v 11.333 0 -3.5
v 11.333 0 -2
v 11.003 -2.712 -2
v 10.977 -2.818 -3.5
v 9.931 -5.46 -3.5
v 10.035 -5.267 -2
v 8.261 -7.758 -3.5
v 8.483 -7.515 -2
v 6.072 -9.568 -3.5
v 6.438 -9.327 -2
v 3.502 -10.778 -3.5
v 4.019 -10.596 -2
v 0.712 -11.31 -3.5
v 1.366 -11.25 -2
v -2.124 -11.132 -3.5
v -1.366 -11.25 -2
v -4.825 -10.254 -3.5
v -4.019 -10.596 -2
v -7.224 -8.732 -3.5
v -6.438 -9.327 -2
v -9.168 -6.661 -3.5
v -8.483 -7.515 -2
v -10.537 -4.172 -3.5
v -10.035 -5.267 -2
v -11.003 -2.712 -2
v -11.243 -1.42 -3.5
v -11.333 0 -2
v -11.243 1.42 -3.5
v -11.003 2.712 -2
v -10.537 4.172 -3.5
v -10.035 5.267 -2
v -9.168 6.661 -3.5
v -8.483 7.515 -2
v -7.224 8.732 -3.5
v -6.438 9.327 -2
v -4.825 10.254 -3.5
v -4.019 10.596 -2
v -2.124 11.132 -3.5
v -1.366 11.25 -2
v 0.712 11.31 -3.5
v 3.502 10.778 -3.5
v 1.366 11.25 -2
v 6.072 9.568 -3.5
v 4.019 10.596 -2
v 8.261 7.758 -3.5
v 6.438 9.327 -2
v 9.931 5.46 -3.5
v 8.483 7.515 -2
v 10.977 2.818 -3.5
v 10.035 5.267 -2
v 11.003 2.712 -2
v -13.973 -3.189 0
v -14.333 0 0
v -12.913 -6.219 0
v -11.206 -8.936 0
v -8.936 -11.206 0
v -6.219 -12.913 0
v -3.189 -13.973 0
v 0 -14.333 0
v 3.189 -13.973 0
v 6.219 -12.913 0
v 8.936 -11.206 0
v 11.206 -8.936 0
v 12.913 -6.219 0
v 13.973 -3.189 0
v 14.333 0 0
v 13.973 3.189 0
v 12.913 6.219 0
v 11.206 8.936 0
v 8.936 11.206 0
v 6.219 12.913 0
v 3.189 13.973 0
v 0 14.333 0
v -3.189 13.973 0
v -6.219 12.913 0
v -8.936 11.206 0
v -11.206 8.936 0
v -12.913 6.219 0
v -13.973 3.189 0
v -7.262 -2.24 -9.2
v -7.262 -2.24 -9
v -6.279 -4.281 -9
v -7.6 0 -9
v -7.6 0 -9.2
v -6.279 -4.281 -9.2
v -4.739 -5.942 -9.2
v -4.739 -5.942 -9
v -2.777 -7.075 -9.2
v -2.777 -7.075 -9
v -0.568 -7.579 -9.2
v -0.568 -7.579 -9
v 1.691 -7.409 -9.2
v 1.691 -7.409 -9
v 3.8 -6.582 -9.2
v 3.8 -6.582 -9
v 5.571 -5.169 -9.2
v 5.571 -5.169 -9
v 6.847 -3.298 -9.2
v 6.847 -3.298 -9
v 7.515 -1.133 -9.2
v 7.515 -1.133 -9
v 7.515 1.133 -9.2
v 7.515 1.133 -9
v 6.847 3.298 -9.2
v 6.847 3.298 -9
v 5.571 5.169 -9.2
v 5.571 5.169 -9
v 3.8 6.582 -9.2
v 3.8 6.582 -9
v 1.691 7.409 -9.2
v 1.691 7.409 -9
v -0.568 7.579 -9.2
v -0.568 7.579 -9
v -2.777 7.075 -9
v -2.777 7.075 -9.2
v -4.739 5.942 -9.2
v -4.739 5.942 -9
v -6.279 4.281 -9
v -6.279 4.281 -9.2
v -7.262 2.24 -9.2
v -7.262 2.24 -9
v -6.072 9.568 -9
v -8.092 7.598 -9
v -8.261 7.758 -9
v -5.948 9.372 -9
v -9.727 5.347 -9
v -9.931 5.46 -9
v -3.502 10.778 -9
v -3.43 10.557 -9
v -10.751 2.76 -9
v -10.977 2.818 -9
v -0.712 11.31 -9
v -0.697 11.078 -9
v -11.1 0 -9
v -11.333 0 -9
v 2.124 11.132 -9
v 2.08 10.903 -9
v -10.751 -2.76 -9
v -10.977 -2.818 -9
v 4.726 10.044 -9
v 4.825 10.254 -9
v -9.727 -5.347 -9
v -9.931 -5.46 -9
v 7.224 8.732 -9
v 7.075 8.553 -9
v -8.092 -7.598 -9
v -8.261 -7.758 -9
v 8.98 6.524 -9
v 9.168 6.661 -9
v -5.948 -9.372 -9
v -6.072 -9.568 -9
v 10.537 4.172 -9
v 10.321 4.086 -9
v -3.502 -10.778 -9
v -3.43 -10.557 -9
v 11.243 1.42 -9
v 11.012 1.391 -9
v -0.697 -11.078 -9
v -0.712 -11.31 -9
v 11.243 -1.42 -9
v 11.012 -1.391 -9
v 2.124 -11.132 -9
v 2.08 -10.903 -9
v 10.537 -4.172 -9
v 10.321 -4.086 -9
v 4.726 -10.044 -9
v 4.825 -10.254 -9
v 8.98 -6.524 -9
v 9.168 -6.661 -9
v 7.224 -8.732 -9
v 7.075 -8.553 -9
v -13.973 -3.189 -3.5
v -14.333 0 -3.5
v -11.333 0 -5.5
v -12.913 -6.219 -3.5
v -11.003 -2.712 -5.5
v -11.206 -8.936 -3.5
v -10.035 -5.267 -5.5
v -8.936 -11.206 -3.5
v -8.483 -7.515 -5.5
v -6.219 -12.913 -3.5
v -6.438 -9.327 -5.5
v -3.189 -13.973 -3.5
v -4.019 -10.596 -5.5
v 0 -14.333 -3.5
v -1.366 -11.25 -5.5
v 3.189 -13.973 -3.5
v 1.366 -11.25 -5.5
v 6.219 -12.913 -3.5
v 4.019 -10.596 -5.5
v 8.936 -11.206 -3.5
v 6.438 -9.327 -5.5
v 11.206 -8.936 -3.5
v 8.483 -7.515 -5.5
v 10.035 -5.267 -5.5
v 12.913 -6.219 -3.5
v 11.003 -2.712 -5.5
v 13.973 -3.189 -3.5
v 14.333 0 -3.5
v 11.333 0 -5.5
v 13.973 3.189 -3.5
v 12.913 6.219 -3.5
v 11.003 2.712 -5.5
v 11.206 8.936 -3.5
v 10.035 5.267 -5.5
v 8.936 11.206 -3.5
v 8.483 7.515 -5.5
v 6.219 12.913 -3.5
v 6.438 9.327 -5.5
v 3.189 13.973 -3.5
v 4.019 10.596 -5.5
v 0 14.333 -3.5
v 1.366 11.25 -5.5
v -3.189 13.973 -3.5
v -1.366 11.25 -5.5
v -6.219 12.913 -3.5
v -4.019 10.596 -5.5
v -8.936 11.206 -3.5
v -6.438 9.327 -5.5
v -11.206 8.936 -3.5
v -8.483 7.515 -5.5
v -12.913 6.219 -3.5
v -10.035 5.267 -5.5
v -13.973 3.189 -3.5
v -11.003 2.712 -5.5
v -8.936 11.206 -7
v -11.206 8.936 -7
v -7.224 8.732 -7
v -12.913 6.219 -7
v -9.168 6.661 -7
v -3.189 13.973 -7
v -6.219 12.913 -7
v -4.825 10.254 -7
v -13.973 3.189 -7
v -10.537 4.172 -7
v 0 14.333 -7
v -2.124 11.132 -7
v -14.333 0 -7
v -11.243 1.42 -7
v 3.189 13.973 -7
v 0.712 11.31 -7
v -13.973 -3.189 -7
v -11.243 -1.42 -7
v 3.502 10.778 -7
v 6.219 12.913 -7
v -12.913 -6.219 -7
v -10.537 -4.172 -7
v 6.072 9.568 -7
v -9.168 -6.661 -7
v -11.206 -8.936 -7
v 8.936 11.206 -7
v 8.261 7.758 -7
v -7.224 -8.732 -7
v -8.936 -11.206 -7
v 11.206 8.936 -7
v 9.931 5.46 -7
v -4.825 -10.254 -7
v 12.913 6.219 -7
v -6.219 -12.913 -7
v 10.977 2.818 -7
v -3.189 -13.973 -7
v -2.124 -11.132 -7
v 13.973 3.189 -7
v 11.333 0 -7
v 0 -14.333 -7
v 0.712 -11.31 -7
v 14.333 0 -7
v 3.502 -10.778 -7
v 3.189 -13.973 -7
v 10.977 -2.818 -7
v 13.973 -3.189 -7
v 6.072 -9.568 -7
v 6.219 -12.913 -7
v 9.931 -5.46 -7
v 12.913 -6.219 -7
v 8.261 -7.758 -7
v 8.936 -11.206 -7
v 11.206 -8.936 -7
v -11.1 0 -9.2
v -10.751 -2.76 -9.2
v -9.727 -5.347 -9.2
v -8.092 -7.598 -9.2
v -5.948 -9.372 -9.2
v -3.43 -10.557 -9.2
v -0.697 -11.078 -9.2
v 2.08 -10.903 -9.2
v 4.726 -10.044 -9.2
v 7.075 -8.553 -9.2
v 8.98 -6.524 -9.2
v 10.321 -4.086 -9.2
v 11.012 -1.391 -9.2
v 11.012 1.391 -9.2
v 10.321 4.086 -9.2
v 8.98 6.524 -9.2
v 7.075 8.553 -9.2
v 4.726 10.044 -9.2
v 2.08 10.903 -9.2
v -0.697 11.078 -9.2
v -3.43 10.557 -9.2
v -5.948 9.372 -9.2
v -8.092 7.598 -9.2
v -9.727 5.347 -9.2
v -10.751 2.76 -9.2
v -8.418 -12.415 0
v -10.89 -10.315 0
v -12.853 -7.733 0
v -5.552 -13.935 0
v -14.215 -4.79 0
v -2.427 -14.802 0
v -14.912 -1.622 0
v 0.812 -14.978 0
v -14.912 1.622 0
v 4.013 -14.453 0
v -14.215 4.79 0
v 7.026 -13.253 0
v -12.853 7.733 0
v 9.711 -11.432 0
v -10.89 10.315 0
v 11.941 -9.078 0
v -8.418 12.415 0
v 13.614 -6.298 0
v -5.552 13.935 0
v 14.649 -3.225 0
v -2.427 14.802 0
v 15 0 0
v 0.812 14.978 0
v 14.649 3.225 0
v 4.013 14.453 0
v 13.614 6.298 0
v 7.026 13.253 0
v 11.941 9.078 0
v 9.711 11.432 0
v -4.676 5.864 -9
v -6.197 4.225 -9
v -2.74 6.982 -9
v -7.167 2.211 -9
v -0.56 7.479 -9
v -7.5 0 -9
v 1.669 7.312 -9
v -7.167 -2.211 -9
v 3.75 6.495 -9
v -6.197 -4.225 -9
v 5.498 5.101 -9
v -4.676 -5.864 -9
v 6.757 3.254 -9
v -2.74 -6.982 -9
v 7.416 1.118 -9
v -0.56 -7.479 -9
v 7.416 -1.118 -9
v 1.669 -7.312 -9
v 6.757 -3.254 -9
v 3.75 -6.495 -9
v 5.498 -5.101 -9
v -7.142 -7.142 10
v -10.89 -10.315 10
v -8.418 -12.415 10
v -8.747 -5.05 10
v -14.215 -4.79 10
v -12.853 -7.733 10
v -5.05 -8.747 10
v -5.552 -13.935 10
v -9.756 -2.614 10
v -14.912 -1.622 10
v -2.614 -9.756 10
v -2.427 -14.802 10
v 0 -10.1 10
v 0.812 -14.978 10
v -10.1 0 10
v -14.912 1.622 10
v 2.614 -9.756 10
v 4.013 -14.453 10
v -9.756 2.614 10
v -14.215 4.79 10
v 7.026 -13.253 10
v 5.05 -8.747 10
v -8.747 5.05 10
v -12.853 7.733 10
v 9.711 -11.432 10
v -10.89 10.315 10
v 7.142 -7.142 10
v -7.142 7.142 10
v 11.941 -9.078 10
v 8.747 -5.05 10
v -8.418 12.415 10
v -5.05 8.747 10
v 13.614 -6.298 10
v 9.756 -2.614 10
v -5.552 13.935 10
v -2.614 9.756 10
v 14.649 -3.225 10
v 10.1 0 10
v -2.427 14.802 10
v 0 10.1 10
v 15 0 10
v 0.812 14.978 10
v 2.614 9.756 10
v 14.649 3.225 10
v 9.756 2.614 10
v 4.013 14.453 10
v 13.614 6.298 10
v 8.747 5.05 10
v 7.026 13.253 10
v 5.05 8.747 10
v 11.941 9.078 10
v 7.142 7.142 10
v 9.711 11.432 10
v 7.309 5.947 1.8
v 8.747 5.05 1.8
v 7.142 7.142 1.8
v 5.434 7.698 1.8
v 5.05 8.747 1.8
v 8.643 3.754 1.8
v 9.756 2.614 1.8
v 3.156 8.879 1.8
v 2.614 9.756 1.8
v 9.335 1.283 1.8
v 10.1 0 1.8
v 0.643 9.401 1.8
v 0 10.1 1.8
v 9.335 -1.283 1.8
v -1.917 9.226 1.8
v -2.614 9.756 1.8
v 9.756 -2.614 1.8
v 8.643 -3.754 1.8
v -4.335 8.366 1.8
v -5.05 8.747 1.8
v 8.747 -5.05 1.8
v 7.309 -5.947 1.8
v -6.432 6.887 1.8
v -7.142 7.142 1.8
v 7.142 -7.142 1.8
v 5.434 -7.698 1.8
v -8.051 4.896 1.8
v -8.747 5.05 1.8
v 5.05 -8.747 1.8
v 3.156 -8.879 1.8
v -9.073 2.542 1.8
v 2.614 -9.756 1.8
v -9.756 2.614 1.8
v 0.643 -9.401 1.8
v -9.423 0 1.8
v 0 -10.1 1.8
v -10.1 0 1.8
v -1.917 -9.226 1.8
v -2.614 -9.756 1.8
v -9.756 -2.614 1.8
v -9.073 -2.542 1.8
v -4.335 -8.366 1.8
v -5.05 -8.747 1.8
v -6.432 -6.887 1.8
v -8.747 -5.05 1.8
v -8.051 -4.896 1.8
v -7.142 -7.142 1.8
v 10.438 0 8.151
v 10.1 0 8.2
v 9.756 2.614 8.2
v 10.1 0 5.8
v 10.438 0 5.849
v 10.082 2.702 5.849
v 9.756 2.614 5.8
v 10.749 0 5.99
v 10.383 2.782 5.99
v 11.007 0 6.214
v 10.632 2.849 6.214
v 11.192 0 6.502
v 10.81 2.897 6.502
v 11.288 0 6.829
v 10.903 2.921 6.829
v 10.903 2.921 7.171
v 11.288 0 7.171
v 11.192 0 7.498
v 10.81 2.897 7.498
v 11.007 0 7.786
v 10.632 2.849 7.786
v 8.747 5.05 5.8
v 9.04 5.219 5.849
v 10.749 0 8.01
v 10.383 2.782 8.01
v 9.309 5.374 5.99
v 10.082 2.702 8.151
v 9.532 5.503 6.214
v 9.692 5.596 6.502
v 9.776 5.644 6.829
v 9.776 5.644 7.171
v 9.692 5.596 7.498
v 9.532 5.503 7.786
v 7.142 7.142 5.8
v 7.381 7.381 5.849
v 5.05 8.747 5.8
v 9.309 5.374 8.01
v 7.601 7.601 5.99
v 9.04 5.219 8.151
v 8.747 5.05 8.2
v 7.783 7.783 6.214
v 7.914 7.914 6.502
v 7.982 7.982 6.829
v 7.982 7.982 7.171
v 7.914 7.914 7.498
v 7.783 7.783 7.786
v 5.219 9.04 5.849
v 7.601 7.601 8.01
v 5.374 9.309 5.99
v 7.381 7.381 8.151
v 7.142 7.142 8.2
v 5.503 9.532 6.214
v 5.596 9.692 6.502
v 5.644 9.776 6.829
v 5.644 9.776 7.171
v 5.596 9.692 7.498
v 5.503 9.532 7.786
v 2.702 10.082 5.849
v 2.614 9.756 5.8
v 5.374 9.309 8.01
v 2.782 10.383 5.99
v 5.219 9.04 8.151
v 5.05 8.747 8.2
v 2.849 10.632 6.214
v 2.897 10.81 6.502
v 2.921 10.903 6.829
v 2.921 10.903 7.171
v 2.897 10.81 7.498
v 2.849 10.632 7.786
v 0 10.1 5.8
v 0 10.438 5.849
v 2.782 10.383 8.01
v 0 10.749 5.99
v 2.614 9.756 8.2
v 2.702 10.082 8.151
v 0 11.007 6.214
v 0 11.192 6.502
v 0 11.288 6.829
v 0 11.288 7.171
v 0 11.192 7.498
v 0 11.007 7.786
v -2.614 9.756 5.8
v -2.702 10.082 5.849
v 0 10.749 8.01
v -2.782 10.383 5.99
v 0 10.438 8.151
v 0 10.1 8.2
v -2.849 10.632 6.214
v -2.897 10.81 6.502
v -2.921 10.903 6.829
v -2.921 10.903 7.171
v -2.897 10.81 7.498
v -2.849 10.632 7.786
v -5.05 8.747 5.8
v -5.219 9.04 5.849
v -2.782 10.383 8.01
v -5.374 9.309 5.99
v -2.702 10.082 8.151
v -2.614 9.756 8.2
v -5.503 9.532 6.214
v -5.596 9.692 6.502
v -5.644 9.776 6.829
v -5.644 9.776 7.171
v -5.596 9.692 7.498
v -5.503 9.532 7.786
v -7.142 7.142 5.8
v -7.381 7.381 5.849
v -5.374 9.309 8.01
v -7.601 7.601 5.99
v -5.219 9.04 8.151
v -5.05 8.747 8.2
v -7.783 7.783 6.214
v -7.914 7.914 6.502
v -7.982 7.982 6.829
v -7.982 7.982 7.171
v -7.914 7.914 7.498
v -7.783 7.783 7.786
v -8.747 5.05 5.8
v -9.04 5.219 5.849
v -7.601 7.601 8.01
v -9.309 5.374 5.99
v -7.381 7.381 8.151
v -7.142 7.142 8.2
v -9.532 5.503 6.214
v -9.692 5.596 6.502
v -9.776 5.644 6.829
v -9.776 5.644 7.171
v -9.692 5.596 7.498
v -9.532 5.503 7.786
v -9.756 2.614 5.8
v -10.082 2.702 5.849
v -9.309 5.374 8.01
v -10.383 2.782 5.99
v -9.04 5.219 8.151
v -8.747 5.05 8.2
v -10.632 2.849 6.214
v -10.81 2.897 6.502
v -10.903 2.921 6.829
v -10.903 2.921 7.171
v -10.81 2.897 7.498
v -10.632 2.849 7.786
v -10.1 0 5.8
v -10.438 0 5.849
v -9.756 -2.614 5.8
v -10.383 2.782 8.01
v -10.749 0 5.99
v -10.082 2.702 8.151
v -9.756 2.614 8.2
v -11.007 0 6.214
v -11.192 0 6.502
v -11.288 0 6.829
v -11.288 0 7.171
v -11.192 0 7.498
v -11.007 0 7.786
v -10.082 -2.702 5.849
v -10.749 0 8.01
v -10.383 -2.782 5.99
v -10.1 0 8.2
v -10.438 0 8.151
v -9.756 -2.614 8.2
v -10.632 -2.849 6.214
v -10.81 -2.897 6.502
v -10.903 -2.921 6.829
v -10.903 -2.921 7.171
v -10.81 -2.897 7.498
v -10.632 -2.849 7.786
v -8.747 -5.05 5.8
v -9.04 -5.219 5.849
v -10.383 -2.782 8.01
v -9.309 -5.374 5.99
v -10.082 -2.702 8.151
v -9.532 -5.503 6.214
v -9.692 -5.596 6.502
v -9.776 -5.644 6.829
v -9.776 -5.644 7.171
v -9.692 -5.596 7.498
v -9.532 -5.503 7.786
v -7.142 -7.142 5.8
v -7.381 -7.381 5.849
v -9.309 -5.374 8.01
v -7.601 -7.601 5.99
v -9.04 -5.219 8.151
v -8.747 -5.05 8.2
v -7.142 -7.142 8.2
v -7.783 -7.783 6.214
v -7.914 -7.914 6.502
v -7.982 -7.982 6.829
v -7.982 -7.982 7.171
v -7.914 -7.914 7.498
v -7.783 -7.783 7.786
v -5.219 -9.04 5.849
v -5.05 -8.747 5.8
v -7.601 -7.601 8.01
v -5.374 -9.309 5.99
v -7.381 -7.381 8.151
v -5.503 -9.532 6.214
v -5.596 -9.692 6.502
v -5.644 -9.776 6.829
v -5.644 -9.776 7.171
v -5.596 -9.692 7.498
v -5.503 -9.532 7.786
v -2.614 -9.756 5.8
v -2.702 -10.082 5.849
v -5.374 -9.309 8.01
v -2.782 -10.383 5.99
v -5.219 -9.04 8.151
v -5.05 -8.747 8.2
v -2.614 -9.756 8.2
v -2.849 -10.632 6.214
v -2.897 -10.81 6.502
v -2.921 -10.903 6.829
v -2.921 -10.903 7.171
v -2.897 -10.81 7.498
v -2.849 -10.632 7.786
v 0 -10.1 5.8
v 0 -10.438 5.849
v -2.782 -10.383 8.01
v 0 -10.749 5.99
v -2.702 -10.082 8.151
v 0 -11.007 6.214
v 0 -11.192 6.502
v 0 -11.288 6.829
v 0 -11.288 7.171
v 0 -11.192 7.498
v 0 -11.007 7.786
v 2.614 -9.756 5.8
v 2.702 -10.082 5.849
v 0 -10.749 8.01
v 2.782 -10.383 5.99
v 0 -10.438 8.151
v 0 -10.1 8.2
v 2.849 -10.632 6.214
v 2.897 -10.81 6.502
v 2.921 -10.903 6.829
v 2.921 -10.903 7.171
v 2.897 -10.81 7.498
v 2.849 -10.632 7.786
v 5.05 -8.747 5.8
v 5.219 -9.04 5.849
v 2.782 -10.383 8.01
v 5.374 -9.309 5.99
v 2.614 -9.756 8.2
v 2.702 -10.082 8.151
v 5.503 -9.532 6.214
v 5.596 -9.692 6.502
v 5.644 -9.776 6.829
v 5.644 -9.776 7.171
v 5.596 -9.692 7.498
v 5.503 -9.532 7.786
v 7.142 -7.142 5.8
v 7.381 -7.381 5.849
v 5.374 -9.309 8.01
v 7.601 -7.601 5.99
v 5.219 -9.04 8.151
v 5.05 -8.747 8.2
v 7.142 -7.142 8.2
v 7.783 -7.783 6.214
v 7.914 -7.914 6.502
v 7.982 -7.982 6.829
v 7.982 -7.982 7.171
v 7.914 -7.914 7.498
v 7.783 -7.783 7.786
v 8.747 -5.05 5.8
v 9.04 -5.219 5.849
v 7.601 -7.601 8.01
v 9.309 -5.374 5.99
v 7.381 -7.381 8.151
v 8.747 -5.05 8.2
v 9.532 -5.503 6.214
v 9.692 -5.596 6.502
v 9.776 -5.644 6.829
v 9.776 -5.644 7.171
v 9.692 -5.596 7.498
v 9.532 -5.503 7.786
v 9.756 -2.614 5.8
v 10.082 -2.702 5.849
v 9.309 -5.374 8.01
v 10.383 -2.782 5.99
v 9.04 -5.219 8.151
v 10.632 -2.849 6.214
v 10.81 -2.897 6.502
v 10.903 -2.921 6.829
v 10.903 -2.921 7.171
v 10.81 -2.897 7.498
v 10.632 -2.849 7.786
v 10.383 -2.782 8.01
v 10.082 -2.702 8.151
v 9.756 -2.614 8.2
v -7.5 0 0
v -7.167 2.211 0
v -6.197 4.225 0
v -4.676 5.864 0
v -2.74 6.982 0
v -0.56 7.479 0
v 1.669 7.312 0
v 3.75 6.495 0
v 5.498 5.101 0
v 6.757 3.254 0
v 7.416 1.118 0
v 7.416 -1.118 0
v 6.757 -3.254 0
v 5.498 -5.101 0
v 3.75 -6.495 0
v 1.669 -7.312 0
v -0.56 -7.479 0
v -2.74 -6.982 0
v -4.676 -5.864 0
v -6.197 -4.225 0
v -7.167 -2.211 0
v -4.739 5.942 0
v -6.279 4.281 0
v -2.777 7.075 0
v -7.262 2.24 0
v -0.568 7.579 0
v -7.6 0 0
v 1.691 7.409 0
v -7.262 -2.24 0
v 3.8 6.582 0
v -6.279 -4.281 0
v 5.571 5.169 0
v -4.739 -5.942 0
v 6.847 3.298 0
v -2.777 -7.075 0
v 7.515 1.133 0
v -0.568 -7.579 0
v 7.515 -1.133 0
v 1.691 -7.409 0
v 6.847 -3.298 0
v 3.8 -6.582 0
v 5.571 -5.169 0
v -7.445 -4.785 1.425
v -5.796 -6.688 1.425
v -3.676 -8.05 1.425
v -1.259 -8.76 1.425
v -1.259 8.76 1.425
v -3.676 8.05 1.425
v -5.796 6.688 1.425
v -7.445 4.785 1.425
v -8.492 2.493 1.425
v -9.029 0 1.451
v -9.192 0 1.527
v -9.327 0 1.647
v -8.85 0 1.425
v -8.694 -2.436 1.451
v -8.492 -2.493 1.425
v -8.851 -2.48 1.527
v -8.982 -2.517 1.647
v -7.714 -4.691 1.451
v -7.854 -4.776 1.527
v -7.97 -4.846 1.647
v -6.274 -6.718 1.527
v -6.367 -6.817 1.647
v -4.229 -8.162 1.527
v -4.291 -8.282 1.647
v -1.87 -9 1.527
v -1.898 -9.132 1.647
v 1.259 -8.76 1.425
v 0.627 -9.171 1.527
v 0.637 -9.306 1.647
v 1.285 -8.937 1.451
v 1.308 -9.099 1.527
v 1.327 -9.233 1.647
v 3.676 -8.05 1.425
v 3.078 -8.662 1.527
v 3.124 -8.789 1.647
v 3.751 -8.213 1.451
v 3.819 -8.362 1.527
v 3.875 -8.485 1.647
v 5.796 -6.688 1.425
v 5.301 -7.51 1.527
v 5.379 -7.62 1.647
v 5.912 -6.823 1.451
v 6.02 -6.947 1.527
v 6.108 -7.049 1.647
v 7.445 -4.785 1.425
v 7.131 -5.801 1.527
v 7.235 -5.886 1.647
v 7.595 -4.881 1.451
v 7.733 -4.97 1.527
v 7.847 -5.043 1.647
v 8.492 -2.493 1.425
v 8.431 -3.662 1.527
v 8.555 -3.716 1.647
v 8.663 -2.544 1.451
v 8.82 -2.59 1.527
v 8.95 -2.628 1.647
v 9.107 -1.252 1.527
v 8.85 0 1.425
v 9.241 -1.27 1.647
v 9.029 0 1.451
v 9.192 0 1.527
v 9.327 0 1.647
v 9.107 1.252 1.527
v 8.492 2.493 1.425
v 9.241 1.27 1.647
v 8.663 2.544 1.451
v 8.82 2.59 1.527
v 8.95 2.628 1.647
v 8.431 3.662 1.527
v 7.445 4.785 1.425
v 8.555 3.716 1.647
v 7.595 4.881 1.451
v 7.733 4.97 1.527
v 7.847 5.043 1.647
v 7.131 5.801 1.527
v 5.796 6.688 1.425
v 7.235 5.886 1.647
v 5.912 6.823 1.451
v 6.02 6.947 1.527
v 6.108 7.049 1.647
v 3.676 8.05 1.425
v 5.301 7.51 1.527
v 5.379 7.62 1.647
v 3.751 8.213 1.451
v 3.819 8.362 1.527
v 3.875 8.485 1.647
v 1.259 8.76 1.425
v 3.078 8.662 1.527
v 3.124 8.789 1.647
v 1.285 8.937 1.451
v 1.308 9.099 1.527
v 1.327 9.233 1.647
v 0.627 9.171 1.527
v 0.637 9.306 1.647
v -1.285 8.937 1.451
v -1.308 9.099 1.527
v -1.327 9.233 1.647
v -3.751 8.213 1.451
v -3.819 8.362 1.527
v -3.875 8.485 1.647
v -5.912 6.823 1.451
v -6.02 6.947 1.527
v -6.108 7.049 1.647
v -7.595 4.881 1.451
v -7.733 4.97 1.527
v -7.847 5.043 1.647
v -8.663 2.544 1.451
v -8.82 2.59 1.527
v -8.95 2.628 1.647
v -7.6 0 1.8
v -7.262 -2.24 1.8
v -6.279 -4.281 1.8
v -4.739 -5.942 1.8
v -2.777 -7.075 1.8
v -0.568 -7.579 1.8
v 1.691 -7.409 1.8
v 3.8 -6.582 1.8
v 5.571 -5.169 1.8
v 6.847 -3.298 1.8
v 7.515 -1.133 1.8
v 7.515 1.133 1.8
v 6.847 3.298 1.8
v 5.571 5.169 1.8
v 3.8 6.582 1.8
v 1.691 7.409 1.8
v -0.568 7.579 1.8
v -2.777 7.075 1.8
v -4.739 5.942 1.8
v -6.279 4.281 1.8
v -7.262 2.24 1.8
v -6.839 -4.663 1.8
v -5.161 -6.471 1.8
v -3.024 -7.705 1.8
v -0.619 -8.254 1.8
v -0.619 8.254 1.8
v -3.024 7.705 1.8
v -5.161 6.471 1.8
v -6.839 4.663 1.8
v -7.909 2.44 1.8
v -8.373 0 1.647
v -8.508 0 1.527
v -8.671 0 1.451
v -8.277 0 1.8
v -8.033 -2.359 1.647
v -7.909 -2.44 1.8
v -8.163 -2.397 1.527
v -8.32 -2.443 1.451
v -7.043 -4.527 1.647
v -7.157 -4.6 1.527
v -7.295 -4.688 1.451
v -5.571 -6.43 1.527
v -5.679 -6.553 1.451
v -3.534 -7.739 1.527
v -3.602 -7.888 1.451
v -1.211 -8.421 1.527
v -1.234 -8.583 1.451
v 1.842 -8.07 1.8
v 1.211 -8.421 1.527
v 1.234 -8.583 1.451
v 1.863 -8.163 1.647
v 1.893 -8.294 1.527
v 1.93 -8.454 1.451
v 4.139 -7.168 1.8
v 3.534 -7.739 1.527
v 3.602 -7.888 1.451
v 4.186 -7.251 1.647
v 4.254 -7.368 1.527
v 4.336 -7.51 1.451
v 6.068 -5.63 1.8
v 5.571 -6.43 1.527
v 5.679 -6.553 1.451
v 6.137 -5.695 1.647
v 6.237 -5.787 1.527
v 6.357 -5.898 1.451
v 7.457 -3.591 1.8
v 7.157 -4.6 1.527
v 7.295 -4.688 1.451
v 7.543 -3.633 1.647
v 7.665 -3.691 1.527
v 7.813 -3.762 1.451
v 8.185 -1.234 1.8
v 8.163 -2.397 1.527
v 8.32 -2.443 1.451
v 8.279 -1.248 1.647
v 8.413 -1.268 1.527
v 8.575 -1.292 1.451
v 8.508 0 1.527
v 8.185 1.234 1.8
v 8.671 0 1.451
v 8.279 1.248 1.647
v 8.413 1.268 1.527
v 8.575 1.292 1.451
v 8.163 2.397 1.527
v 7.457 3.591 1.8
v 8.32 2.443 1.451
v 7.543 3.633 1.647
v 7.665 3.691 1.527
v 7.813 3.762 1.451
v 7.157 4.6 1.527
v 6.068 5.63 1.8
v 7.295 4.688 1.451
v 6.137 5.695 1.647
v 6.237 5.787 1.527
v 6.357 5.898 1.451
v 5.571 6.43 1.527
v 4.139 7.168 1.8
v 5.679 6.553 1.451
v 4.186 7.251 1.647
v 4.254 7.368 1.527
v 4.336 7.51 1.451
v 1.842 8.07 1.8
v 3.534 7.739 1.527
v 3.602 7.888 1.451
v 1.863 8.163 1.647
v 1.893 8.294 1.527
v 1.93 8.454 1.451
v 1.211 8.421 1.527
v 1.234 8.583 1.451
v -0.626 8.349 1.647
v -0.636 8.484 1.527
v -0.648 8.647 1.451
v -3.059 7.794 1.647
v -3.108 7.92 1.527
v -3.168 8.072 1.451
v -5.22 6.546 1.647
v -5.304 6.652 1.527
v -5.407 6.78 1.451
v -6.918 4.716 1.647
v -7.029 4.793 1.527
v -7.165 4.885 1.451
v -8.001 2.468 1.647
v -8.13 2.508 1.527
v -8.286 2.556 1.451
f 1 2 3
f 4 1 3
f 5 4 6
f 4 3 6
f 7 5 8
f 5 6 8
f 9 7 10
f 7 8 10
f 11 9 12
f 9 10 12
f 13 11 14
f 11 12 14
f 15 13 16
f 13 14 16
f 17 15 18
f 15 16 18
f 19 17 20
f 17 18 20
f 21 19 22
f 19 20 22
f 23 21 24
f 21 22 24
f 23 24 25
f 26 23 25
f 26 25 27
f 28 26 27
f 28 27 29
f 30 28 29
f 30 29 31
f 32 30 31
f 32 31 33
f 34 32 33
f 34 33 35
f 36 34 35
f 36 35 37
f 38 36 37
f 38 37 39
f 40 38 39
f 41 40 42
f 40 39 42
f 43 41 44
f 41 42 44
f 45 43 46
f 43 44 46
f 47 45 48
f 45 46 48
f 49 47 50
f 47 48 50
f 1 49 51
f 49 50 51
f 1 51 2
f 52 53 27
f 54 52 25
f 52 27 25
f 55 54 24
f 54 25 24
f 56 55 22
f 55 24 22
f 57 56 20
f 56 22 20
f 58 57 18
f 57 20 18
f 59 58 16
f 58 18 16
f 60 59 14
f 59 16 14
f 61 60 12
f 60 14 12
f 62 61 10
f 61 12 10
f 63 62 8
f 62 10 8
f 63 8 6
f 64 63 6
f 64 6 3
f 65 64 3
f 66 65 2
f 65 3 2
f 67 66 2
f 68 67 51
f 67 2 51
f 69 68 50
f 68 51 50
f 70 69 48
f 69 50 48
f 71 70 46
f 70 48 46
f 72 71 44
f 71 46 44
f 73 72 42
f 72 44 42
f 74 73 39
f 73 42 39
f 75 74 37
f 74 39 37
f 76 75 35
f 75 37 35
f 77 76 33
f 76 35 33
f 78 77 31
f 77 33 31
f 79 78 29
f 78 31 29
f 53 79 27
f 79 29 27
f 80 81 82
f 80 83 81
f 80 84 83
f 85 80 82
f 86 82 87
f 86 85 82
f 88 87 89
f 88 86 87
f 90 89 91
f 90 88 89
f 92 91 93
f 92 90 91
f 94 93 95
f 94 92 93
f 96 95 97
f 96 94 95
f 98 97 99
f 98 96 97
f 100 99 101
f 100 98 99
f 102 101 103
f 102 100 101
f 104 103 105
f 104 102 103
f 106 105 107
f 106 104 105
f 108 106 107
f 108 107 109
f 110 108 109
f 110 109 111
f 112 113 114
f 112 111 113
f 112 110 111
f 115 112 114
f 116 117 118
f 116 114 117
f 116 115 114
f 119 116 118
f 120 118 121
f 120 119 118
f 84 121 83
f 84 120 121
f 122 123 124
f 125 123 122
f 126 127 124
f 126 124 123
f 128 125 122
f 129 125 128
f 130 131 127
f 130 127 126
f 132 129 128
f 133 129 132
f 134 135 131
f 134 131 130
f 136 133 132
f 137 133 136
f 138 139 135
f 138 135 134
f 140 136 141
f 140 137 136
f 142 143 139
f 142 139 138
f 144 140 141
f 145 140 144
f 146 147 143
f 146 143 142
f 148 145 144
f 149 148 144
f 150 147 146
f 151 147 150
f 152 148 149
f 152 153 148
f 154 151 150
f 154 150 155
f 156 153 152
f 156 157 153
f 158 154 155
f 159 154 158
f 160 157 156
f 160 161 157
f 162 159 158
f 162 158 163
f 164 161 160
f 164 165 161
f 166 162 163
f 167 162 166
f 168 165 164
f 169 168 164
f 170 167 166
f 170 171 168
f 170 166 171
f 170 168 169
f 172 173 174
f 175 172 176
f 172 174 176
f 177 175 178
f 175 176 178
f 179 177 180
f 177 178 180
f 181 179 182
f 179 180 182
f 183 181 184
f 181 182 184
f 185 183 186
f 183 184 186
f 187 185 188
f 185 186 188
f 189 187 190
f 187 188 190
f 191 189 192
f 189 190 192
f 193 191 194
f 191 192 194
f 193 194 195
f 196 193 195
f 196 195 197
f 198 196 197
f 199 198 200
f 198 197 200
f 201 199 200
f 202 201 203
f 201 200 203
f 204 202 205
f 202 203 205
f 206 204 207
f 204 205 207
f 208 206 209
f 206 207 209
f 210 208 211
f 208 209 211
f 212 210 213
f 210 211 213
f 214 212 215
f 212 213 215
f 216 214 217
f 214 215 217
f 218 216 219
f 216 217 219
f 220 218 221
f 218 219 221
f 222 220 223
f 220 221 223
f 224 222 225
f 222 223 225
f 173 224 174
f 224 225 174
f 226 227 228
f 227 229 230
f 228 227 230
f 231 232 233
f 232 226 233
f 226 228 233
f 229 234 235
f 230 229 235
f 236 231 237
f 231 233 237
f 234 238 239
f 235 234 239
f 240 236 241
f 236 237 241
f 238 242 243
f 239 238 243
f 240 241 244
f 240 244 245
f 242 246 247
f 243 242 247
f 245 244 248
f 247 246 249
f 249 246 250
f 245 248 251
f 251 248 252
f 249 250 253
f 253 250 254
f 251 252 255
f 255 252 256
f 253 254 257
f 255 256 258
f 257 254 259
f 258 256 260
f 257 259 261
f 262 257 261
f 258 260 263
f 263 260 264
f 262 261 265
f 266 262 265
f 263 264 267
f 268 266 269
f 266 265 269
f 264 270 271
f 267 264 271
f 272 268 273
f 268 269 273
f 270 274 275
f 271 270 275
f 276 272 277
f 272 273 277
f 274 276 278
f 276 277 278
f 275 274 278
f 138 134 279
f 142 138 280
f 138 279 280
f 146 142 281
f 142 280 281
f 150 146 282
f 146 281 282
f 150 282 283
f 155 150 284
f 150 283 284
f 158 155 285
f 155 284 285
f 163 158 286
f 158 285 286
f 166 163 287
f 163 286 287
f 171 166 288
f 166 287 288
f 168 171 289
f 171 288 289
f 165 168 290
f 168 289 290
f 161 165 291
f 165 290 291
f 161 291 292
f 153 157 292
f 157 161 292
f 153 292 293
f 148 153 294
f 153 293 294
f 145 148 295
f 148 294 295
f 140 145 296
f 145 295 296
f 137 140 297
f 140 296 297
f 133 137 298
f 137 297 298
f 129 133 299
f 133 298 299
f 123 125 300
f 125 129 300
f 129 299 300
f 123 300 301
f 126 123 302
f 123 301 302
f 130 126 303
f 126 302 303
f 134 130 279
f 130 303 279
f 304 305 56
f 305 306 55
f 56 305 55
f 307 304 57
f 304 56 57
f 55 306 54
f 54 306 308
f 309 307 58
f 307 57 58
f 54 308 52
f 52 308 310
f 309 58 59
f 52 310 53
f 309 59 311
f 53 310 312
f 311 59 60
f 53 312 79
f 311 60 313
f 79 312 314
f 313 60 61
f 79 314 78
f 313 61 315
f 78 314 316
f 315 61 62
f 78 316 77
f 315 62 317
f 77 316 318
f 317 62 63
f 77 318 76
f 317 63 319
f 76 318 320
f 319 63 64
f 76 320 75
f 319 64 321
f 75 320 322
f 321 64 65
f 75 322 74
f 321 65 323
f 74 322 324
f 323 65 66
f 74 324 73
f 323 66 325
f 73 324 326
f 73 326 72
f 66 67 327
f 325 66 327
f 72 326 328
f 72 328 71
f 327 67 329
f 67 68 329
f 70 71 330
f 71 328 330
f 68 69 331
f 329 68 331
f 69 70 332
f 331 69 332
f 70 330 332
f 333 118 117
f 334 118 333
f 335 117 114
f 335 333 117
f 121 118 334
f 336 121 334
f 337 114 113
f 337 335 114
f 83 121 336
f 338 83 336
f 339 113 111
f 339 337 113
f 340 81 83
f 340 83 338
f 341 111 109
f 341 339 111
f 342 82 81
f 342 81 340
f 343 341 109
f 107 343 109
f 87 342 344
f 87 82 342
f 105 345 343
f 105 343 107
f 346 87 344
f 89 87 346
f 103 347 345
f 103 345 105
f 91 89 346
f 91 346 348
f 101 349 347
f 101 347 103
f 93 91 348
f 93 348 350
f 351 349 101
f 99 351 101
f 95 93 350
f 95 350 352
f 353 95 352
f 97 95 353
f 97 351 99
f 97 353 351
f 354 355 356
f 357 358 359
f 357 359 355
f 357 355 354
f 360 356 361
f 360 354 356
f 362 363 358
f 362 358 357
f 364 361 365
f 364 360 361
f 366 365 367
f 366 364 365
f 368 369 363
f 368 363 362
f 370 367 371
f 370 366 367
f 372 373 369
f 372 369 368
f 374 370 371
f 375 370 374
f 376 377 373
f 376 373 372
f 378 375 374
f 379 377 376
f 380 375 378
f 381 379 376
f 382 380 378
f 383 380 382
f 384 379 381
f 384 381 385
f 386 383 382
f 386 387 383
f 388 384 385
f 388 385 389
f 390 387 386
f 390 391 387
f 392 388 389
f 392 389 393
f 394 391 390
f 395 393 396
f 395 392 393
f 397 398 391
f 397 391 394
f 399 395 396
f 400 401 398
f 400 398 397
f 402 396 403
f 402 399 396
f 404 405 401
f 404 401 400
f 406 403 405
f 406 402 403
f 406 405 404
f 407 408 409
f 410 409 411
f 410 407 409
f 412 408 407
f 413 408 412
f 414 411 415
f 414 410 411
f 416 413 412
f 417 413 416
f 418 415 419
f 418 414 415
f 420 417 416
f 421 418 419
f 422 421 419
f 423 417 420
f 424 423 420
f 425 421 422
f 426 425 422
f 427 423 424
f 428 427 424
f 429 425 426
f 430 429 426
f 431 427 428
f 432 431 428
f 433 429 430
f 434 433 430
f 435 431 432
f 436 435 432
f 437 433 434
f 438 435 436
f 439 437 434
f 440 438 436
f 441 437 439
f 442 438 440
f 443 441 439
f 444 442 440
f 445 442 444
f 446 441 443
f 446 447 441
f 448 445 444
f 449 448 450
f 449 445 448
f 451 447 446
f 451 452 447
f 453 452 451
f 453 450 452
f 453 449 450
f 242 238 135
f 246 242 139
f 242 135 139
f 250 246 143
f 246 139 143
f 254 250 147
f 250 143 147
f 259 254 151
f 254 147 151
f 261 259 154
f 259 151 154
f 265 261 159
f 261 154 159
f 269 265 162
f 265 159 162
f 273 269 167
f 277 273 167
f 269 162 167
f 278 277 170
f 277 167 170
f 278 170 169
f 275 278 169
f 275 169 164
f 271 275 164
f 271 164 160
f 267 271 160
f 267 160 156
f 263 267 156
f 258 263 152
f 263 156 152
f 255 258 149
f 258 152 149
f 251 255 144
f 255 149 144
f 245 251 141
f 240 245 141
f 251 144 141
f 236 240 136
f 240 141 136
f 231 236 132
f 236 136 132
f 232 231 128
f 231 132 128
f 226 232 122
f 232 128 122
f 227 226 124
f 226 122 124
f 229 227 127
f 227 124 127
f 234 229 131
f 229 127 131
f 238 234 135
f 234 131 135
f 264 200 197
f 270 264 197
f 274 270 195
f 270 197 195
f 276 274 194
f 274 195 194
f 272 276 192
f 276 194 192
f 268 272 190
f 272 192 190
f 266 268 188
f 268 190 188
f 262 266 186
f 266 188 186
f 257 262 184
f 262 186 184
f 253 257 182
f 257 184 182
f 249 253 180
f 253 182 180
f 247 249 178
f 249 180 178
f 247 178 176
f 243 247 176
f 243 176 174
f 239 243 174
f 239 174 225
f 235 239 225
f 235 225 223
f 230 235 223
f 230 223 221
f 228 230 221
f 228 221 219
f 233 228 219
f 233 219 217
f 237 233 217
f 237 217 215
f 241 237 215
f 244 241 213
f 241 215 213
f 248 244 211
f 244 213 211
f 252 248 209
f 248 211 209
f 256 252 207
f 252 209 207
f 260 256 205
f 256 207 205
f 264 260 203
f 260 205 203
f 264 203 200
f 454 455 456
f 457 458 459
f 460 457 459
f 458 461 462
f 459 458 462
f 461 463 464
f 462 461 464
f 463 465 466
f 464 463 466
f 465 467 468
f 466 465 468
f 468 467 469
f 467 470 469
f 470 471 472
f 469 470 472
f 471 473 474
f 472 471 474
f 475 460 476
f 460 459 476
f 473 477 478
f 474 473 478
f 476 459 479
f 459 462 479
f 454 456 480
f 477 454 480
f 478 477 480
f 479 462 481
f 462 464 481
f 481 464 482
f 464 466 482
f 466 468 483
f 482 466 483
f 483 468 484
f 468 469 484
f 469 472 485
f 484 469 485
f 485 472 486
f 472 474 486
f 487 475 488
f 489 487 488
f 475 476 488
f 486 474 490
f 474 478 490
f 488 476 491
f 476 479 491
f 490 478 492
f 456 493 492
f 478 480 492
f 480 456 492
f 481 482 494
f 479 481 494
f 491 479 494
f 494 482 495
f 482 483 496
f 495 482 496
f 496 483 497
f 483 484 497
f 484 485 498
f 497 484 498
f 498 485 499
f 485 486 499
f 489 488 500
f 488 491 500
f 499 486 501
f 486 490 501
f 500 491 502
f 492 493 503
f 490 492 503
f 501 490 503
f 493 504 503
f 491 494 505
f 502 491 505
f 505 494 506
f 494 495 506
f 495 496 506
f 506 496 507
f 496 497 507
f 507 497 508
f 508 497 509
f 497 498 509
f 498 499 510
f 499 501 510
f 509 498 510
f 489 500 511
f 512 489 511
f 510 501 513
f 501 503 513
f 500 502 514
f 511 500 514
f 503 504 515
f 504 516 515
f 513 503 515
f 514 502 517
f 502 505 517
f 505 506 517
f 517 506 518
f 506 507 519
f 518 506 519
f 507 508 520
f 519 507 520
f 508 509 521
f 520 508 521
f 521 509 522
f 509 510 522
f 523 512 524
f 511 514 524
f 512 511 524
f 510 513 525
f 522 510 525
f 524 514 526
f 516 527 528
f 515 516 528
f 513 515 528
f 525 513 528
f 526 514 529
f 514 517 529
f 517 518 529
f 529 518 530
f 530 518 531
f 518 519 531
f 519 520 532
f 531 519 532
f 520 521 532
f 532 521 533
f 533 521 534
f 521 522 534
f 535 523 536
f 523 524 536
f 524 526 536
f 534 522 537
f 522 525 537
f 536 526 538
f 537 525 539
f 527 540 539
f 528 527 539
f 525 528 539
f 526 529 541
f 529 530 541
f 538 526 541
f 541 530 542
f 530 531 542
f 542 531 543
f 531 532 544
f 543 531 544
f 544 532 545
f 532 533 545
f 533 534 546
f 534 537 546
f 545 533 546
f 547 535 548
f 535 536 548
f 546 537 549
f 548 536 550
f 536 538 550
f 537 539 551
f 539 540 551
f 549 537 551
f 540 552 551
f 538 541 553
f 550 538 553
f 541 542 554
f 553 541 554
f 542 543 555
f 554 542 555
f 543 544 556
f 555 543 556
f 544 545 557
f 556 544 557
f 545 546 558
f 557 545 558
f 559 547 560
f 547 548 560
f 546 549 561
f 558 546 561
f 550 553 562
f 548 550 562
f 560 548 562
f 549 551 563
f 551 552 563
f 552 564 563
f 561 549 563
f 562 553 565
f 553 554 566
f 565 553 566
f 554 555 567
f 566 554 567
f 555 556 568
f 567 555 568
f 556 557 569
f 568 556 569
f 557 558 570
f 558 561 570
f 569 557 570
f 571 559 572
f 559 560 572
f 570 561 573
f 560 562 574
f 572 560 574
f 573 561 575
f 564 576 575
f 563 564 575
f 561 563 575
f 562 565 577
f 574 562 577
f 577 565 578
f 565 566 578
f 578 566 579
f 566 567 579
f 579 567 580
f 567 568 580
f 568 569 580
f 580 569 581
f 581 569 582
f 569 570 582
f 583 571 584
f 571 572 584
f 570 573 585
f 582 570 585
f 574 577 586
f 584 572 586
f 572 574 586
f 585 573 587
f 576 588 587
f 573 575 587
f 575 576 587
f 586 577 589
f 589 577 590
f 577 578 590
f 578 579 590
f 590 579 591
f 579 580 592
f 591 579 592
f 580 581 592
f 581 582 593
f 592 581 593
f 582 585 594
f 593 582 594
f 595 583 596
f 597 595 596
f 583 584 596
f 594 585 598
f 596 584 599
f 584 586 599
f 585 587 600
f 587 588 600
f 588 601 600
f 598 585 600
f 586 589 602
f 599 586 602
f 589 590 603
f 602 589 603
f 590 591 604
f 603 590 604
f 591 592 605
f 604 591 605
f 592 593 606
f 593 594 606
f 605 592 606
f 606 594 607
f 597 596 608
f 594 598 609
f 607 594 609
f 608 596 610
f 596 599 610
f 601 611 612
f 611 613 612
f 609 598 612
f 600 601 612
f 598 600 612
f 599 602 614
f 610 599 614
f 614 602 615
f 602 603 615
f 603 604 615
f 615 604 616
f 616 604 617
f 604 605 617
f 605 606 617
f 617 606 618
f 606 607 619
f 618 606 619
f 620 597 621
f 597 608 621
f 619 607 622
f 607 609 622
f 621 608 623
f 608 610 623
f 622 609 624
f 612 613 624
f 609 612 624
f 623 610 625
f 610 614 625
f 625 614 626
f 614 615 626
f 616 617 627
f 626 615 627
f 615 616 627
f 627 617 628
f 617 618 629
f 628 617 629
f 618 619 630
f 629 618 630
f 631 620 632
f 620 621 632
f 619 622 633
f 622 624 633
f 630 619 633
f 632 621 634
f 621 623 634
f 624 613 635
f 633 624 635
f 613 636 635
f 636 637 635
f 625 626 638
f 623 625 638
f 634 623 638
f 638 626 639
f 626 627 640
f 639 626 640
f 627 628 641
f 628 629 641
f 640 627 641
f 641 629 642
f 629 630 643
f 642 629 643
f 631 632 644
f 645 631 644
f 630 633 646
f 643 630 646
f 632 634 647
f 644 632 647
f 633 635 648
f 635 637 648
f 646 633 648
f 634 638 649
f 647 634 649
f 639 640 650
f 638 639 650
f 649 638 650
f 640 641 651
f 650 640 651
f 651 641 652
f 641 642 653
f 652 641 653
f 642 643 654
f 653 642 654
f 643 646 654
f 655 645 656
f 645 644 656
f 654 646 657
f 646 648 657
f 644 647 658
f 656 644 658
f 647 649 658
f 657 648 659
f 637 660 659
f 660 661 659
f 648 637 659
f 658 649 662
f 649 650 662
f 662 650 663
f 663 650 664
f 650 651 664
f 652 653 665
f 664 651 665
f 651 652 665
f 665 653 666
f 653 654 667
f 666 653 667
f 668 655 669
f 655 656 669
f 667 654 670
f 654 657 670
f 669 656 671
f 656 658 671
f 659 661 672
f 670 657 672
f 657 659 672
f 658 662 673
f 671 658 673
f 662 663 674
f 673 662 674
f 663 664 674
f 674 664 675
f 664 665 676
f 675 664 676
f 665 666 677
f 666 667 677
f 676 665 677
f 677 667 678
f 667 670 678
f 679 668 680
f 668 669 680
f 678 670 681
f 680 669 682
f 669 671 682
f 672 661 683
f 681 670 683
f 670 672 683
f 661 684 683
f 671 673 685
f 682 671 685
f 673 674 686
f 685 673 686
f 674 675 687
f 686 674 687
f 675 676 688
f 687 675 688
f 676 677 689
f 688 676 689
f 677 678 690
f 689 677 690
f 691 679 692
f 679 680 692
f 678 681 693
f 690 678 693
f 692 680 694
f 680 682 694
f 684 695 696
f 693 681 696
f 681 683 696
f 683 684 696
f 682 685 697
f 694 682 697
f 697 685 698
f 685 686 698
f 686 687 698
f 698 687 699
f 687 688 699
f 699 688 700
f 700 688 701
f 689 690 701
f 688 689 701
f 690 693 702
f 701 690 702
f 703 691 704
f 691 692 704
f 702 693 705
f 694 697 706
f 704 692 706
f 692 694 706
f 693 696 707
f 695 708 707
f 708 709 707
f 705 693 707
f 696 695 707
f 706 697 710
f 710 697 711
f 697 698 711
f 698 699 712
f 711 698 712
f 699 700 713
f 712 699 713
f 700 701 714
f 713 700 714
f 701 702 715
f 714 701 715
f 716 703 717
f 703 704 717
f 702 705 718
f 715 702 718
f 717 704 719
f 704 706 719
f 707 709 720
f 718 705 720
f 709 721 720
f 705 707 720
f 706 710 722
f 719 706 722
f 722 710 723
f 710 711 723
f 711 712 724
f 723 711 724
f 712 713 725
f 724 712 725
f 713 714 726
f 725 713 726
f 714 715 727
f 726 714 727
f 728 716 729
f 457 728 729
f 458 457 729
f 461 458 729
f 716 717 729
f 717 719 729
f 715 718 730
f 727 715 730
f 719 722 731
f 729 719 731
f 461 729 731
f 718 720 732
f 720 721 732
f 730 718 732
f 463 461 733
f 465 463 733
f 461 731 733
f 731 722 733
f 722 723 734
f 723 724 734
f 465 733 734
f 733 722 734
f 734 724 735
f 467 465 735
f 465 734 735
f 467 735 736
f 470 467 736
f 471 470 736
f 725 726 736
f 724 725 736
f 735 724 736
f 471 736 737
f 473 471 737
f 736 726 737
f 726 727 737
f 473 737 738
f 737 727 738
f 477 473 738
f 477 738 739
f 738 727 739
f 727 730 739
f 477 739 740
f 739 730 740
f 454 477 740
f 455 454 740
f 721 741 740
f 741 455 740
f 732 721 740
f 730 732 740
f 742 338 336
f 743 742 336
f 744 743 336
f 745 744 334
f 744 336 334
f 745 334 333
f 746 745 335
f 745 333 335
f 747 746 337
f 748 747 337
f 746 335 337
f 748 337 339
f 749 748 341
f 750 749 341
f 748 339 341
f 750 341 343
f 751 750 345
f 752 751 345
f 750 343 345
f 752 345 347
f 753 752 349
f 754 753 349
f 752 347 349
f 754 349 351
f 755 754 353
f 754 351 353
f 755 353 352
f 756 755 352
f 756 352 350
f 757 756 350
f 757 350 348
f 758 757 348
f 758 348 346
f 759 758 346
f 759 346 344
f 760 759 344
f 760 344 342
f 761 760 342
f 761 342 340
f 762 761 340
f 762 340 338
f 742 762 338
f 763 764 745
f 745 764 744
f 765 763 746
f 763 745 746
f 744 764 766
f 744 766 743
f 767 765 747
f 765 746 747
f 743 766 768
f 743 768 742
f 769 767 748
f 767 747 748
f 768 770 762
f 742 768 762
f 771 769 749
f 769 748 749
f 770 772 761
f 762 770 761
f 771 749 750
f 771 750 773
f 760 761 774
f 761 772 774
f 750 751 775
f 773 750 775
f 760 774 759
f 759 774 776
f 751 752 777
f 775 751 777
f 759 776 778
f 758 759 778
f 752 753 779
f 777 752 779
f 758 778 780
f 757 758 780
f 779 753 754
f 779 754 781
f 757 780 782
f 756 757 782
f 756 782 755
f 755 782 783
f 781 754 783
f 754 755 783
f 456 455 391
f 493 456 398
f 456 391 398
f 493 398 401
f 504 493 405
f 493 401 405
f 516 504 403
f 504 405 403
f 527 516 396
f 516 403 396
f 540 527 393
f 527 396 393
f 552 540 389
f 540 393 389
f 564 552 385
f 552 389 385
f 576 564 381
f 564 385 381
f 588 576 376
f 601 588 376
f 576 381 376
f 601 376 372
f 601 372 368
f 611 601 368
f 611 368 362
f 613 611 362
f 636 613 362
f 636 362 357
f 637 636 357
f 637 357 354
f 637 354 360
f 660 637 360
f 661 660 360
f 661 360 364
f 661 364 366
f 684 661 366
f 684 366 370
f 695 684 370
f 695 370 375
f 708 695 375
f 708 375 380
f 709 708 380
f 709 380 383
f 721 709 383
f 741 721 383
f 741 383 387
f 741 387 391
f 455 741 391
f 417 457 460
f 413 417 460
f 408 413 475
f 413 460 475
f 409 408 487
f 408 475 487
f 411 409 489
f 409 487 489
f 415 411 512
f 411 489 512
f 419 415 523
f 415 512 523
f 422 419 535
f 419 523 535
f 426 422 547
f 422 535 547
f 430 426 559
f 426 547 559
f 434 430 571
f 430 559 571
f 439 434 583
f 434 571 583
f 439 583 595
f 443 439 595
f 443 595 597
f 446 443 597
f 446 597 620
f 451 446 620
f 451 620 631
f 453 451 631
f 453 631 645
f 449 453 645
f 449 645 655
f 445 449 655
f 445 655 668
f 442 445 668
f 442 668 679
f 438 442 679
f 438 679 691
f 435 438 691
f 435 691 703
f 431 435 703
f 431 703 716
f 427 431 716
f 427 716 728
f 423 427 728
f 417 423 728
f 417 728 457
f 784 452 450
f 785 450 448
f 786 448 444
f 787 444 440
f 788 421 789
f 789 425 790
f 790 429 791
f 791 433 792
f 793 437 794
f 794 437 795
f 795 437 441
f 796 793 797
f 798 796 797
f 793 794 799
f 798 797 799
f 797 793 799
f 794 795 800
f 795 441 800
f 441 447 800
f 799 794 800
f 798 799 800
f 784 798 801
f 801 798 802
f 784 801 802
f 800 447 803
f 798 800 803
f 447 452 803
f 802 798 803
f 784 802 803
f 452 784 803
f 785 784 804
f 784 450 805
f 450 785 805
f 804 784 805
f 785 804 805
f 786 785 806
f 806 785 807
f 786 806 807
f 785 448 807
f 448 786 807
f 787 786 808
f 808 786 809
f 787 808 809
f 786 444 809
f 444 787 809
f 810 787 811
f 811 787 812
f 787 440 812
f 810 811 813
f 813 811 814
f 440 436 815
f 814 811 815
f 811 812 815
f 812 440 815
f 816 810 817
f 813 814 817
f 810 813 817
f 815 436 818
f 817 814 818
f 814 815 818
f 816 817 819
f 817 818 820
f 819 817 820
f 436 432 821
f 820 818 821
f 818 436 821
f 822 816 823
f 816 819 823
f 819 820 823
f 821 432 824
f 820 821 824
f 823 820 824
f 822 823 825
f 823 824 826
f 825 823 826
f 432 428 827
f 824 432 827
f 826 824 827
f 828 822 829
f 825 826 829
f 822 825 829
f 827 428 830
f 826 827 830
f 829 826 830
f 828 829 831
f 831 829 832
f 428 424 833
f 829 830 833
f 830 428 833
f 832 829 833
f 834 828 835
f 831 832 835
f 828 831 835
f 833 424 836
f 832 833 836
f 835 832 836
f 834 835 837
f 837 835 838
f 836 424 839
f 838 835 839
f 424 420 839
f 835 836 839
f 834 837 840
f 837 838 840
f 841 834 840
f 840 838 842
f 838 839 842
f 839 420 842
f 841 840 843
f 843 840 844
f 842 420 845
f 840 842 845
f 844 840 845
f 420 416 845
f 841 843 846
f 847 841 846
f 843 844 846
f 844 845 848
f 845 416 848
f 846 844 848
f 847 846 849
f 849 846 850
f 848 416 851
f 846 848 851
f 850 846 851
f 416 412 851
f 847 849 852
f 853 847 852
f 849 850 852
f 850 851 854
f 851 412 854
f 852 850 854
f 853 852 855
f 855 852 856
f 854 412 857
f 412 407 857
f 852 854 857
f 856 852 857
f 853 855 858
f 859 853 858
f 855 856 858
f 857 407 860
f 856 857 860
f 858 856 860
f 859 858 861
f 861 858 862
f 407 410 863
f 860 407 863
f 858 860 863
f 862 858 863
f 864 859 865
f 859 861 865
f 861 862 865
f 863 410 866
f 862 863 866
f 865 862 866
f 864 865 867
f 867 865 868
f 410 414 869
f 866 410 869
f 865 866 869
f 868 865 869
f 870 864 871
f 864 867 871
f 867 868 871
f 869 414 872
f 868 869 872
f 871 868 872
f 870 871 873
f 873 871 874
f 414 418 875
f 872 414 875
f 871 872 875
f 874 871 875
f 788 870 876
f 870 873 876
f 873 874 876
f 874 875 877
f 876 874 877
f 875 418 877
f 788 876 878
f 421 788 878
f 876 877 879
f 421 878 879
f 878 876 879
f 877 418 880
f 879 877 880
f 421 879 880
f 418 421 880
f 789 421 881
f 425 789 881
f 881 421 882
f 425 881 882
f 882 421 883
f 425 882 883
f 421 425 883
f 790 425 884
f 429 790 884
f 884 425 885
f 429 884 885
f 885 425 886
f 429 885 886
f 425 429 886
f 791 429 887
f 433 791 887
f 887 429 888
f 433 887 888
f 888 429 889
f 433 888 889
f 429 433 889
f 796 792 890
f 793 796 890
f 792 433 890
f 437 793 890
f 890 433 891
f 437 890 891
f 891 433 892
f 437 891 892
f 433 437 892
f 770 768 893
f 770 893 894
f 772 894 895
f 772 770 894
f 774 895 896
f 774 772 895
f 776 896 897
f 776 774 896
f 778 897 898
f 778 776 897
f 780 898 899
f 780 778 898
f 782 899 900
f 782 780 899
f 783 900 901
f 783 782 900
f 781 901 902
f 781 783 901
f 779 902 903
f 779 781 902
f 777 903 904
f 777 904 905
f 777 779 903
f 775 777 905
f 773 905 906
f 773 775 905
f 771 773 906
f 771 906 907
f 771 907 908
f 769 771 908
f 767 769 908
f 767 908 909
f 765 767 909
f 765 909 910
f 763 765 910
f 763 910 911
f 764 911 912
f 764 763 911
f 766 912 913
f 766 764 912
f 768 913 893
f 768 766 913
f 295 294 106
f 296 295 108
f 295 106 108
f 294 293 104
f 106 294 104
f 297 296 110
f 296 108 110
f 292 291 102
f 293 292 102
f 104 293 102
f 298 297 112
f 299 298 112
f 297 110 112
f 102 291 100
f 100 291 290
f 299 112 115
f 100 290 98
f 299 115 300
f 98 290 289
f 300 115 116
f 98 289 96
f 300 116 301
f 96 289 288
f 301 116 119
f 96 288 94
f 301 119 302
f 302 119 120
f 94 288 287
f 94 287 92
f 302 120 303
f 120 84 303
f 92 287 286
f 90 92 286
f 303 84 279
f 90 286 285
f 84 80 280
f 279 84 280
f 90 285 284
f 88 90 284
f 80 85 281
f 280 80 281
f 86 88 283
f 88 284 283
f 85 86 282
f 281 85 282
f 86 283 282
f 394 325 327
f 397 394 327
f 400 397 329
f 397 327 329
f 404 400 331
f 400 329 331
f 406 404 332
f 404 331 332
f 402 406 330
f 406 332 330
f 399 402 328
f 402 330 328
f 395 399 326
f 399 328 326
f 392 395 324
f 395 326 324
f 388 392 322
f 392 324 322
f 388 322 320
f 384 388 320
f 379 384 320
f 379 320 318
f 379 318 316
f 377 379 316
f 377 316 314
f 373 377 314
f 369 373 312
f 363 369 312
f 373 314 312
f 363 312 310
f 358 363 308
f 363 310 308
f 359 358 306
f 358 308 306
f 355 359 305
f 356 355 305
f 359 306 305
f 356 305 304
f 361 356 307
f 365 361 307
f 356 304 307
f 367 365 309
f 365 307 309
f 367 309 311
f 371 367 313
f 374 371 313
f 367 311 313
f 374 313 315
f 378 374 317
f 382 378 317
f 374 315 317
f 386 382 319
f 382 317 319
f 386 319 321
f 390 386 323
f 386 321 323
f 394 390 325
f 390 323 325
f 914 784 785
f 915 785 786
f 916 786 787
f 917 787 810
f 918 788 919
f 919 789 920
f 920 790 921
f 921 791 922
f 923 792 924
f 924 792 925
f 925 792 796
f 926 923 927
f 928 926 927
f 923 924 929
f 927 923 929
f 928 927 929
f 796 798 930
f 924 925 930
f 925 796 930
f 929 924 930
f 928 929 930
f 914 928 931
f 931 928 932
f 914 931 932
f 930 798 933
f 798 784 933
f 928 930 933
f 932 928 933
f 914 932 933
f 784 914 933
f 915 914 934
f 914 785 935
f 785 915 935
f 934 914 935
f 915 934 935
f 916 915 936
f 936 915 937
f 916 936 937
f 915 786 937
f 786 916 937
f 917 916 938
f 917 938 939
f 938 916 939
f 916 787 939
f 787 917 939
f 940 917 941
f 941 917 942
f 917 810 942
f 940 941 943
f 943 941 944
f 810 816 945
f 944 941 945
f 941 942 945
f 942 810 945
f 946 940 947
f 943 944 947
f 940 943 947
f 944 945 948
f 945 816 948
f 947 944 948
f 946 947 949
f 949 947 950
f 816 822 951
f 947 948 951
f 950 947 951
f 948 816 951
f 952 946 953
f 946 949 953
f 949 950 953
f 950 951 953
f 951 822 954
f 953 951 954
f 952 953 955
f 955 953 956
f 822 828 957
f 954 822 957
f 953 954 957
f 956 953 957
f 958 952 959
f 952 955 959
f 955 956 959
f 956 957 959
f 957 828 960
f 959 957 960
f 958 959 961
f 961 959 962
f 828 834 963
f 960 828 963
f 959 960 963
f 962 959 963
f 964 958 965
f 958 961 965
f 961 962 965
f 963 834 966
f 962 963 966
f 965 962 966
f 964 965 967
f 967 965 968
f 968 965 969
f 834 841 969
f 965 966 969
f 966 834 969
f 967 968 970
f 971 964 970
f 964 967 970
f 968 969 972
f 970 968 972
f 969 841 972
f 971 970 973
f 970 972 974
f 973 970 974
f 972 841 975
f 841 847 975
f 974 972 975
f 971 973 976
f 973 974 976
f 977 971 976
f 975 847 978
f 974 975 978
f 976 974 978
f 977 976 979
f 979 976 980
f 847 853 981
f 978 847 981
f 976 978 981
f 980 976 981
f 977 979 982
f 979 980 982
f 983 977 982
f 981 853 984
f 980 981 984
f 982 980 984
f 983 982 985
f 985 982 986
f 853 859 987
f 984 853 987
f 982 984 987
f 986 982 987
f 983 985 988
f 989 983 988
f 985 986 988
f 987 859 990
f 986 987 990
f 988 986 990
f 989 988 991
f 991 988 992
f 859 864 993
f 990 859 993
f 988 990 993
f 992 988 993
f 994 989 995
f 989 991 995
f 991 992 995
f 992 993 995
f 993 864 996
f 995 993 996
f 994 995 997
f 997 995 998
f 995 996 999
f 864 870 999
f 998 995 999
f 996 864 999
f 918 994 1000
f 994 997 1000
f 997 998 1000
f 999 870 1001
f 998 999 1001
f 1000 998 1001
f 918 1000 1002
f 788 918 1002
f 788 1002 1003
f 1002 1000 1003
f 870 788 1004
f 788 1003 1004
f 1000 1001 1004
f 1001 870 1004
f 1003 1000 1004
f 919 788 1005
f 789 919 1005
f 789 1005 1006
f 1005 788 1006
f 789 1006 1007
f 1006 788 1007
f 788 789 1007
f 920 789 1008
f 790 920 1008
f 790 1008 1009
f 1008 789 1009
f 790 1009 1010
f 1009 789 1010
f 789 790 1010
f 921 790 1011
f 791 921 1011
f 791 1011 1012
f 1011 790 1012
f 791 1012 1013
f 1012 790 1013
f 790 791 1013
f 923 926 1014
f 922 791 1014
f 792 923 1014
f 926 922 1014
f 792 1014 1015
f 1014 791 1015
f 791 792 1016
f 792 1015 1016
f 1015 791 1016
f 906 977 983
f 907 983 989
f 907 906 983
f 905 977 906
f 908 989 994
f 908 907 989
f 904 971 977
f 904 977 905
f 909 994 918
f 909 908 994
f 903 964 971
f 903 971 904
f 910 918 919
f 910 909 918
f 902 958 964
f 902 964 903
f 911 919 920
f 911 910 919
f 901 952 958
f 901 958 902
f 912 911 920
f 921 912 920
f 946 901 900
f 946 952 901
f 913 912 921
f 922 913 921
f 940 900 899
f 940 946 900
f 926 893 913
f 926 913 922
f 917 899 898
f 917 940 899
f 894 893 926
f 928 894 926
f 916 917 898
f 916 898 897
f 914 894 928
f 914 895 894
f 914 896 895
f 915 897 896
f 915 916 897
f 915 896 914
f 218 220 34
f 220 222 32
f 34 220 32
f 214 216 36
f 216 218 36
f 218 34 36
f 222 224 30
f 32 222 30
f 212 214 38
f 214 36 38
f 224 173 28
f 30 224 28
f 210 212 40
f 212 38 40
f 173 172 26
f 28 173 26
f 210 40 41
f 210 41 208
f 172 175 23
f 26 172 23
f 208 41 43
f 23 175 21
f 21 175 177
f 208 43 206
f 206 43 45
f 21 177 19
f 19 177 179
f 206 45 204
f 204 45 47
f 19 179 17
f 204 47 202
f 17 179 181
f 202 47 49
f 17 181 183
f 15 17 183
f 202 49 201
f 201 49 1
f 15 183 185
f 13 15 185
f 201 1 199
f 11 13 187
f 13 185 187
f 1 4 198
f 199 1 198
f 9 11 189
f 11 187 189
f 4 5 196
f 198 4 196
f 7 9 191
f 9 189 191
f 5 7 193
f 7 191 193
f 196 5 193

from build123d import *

# Parameters (mm, degrees)
SKETCH1_R           = 15
BOSS_EXTRUDE1_DEPTH = 10
SKETCH2_R           = 10.1
CUT_EXTRUDE1_DEPTH  = 24.452078799
SKETCH3_R           = 1.2
SKETCH5_W           = 11
SKETCH5_H           = 3.5
SKETCH7_R           = 0.625
SKETCH9_R           = 11.332657873
BOSS_EXTRUDE2_DEPTH = 9
SKETCH10_R          = 7.5
CUT_EXTRUDE2_DEPTH  = 29.478061732
LPATTERN1_COUNT     = 3
LPATTERN1_PITCH     = 3.5


with BuildPart() as part:
    # Sketch1 → Boss-Extrude1 (new body)
    with BuildSketch(Plane.XY):
        Circle(SKETCH1_R)
    extrude(amount=BOSS_EXTRUDE1_DEPTH)

    # Sketch2 → Cut-Extrude1 (cut, through all)
    with BuildSketch(Plane.XY.offset(10)):
        Circle(SKETCH2_R)
    extrude(amount=-CUT_EXTRUDE1_DEPTH, mode=Mode.SUBTRACT)

    # Sketch3 → Cut-Revolve2 (revolve, cut)
    with BuildSketch(Plane(origin=(0, 0, 0), x_dir=(0, 0, -1), z_dir=(1, 0, 0)), mode=Mode.PRIVATE) as cut_revolve2_sk:
        with Locations((-7, 10.1)):
            Circle(SKETCH3_R)
    revolve(cut_revolve2_sk.sketch.rotate(Axis((0, 0, 0), (0, 0, 1)), 270), axis=Axis((0, 0, 0), (0, 0, 1)), mode=Mode.SUBTRACT)

    # Sketch5 → Revolve1 (revolve)
    with BuildSketch(Plane(origin=(0, 0, 0), x_dir=(0, 0, -1), z_dir=(1, 0, 0)), mode=Mode.PRIVATE) as revolve1_sk:
        with Locations((3.7, -9.35)):
            Rectangle(SKETCH5_W, SKETCH5_H)
    revolve(revolve1_sk.sketch.rotate(Axis((0, 0, 0), (0, 0, 1)), 270), axis=Axis((0, 0, 0), (0, 0, 1)))

    # Sketch7 → Cut-Revolve3 (revolve, cut)
    with BuildSketch(Plane(origin=(0, 0, 0), x_dir=(0, 0, -1), z_dir=(1, 0, 0)), mode=Mode.PRIVATE) as cut_revolve3_sk:
        with Locations((-2.05, 8.85)):
            Circle(SKETCH7_R)
    revolve(cut_revolve3_sk.sketch.rotate(Axis((0, 0, 0), (0, 0, 1)), 90), axis=Axis((0, 0, 0), (0, 0, 1)), mode=Mode.SUBTRACT)

    # Sketch9 → Boss-Extrude2 (add)
    with BuildSketch(Plane(origin=(0, 0, 0), x_dir=(-1, 0, 0), z_dir=(0, 0, -1))):
        with Locations(Location((0, 0, 0), (0, 0, 180))):
            Circle(SKETCH9_R)
    extrude(amount=BOSS_EXTRUDE2_DEPTH)

    # Sketch10 → Cut-Extrude2 (cut, through all)
    with BuildSketch(Plane(origin=(0, 0, -9), x_dir=(-1, 0, 0), z_dir=(0, 0, -1))):
        Circle(SKETCH10_R)
    extrude(amount=-CUT_EXTRUDE2_DEPTH, mode=Mode.SUBTRACT)

    # Sketch11 → Revolve2 (revolve)
    with BuildSketch(Plane(origin=(0, 0, 0), x_dir=(0, 0, -1), z_dir=(1, 0, 0)), mode=Mode.PRIVATE) as revolve2_sk:
        Polygon((9, 11.332657873), (7, 11.332657873), (7, 14.332657873), align=None)
    revolve2 = revolve(revolve2_sk.sketch.rotate(Axis((0, 0, 0), (0, 0, 1)), 90), axis=Axis((0, 0, 0), (0, 0, 1)))

    # LPattern1: Revolve2 ×3
    with Locations(*[(0, 0, i * LPATTERN1_PITCH) for i in range(1, LPATTERN1_COUNT)]):
        add(revolve2)


solid = part.part
